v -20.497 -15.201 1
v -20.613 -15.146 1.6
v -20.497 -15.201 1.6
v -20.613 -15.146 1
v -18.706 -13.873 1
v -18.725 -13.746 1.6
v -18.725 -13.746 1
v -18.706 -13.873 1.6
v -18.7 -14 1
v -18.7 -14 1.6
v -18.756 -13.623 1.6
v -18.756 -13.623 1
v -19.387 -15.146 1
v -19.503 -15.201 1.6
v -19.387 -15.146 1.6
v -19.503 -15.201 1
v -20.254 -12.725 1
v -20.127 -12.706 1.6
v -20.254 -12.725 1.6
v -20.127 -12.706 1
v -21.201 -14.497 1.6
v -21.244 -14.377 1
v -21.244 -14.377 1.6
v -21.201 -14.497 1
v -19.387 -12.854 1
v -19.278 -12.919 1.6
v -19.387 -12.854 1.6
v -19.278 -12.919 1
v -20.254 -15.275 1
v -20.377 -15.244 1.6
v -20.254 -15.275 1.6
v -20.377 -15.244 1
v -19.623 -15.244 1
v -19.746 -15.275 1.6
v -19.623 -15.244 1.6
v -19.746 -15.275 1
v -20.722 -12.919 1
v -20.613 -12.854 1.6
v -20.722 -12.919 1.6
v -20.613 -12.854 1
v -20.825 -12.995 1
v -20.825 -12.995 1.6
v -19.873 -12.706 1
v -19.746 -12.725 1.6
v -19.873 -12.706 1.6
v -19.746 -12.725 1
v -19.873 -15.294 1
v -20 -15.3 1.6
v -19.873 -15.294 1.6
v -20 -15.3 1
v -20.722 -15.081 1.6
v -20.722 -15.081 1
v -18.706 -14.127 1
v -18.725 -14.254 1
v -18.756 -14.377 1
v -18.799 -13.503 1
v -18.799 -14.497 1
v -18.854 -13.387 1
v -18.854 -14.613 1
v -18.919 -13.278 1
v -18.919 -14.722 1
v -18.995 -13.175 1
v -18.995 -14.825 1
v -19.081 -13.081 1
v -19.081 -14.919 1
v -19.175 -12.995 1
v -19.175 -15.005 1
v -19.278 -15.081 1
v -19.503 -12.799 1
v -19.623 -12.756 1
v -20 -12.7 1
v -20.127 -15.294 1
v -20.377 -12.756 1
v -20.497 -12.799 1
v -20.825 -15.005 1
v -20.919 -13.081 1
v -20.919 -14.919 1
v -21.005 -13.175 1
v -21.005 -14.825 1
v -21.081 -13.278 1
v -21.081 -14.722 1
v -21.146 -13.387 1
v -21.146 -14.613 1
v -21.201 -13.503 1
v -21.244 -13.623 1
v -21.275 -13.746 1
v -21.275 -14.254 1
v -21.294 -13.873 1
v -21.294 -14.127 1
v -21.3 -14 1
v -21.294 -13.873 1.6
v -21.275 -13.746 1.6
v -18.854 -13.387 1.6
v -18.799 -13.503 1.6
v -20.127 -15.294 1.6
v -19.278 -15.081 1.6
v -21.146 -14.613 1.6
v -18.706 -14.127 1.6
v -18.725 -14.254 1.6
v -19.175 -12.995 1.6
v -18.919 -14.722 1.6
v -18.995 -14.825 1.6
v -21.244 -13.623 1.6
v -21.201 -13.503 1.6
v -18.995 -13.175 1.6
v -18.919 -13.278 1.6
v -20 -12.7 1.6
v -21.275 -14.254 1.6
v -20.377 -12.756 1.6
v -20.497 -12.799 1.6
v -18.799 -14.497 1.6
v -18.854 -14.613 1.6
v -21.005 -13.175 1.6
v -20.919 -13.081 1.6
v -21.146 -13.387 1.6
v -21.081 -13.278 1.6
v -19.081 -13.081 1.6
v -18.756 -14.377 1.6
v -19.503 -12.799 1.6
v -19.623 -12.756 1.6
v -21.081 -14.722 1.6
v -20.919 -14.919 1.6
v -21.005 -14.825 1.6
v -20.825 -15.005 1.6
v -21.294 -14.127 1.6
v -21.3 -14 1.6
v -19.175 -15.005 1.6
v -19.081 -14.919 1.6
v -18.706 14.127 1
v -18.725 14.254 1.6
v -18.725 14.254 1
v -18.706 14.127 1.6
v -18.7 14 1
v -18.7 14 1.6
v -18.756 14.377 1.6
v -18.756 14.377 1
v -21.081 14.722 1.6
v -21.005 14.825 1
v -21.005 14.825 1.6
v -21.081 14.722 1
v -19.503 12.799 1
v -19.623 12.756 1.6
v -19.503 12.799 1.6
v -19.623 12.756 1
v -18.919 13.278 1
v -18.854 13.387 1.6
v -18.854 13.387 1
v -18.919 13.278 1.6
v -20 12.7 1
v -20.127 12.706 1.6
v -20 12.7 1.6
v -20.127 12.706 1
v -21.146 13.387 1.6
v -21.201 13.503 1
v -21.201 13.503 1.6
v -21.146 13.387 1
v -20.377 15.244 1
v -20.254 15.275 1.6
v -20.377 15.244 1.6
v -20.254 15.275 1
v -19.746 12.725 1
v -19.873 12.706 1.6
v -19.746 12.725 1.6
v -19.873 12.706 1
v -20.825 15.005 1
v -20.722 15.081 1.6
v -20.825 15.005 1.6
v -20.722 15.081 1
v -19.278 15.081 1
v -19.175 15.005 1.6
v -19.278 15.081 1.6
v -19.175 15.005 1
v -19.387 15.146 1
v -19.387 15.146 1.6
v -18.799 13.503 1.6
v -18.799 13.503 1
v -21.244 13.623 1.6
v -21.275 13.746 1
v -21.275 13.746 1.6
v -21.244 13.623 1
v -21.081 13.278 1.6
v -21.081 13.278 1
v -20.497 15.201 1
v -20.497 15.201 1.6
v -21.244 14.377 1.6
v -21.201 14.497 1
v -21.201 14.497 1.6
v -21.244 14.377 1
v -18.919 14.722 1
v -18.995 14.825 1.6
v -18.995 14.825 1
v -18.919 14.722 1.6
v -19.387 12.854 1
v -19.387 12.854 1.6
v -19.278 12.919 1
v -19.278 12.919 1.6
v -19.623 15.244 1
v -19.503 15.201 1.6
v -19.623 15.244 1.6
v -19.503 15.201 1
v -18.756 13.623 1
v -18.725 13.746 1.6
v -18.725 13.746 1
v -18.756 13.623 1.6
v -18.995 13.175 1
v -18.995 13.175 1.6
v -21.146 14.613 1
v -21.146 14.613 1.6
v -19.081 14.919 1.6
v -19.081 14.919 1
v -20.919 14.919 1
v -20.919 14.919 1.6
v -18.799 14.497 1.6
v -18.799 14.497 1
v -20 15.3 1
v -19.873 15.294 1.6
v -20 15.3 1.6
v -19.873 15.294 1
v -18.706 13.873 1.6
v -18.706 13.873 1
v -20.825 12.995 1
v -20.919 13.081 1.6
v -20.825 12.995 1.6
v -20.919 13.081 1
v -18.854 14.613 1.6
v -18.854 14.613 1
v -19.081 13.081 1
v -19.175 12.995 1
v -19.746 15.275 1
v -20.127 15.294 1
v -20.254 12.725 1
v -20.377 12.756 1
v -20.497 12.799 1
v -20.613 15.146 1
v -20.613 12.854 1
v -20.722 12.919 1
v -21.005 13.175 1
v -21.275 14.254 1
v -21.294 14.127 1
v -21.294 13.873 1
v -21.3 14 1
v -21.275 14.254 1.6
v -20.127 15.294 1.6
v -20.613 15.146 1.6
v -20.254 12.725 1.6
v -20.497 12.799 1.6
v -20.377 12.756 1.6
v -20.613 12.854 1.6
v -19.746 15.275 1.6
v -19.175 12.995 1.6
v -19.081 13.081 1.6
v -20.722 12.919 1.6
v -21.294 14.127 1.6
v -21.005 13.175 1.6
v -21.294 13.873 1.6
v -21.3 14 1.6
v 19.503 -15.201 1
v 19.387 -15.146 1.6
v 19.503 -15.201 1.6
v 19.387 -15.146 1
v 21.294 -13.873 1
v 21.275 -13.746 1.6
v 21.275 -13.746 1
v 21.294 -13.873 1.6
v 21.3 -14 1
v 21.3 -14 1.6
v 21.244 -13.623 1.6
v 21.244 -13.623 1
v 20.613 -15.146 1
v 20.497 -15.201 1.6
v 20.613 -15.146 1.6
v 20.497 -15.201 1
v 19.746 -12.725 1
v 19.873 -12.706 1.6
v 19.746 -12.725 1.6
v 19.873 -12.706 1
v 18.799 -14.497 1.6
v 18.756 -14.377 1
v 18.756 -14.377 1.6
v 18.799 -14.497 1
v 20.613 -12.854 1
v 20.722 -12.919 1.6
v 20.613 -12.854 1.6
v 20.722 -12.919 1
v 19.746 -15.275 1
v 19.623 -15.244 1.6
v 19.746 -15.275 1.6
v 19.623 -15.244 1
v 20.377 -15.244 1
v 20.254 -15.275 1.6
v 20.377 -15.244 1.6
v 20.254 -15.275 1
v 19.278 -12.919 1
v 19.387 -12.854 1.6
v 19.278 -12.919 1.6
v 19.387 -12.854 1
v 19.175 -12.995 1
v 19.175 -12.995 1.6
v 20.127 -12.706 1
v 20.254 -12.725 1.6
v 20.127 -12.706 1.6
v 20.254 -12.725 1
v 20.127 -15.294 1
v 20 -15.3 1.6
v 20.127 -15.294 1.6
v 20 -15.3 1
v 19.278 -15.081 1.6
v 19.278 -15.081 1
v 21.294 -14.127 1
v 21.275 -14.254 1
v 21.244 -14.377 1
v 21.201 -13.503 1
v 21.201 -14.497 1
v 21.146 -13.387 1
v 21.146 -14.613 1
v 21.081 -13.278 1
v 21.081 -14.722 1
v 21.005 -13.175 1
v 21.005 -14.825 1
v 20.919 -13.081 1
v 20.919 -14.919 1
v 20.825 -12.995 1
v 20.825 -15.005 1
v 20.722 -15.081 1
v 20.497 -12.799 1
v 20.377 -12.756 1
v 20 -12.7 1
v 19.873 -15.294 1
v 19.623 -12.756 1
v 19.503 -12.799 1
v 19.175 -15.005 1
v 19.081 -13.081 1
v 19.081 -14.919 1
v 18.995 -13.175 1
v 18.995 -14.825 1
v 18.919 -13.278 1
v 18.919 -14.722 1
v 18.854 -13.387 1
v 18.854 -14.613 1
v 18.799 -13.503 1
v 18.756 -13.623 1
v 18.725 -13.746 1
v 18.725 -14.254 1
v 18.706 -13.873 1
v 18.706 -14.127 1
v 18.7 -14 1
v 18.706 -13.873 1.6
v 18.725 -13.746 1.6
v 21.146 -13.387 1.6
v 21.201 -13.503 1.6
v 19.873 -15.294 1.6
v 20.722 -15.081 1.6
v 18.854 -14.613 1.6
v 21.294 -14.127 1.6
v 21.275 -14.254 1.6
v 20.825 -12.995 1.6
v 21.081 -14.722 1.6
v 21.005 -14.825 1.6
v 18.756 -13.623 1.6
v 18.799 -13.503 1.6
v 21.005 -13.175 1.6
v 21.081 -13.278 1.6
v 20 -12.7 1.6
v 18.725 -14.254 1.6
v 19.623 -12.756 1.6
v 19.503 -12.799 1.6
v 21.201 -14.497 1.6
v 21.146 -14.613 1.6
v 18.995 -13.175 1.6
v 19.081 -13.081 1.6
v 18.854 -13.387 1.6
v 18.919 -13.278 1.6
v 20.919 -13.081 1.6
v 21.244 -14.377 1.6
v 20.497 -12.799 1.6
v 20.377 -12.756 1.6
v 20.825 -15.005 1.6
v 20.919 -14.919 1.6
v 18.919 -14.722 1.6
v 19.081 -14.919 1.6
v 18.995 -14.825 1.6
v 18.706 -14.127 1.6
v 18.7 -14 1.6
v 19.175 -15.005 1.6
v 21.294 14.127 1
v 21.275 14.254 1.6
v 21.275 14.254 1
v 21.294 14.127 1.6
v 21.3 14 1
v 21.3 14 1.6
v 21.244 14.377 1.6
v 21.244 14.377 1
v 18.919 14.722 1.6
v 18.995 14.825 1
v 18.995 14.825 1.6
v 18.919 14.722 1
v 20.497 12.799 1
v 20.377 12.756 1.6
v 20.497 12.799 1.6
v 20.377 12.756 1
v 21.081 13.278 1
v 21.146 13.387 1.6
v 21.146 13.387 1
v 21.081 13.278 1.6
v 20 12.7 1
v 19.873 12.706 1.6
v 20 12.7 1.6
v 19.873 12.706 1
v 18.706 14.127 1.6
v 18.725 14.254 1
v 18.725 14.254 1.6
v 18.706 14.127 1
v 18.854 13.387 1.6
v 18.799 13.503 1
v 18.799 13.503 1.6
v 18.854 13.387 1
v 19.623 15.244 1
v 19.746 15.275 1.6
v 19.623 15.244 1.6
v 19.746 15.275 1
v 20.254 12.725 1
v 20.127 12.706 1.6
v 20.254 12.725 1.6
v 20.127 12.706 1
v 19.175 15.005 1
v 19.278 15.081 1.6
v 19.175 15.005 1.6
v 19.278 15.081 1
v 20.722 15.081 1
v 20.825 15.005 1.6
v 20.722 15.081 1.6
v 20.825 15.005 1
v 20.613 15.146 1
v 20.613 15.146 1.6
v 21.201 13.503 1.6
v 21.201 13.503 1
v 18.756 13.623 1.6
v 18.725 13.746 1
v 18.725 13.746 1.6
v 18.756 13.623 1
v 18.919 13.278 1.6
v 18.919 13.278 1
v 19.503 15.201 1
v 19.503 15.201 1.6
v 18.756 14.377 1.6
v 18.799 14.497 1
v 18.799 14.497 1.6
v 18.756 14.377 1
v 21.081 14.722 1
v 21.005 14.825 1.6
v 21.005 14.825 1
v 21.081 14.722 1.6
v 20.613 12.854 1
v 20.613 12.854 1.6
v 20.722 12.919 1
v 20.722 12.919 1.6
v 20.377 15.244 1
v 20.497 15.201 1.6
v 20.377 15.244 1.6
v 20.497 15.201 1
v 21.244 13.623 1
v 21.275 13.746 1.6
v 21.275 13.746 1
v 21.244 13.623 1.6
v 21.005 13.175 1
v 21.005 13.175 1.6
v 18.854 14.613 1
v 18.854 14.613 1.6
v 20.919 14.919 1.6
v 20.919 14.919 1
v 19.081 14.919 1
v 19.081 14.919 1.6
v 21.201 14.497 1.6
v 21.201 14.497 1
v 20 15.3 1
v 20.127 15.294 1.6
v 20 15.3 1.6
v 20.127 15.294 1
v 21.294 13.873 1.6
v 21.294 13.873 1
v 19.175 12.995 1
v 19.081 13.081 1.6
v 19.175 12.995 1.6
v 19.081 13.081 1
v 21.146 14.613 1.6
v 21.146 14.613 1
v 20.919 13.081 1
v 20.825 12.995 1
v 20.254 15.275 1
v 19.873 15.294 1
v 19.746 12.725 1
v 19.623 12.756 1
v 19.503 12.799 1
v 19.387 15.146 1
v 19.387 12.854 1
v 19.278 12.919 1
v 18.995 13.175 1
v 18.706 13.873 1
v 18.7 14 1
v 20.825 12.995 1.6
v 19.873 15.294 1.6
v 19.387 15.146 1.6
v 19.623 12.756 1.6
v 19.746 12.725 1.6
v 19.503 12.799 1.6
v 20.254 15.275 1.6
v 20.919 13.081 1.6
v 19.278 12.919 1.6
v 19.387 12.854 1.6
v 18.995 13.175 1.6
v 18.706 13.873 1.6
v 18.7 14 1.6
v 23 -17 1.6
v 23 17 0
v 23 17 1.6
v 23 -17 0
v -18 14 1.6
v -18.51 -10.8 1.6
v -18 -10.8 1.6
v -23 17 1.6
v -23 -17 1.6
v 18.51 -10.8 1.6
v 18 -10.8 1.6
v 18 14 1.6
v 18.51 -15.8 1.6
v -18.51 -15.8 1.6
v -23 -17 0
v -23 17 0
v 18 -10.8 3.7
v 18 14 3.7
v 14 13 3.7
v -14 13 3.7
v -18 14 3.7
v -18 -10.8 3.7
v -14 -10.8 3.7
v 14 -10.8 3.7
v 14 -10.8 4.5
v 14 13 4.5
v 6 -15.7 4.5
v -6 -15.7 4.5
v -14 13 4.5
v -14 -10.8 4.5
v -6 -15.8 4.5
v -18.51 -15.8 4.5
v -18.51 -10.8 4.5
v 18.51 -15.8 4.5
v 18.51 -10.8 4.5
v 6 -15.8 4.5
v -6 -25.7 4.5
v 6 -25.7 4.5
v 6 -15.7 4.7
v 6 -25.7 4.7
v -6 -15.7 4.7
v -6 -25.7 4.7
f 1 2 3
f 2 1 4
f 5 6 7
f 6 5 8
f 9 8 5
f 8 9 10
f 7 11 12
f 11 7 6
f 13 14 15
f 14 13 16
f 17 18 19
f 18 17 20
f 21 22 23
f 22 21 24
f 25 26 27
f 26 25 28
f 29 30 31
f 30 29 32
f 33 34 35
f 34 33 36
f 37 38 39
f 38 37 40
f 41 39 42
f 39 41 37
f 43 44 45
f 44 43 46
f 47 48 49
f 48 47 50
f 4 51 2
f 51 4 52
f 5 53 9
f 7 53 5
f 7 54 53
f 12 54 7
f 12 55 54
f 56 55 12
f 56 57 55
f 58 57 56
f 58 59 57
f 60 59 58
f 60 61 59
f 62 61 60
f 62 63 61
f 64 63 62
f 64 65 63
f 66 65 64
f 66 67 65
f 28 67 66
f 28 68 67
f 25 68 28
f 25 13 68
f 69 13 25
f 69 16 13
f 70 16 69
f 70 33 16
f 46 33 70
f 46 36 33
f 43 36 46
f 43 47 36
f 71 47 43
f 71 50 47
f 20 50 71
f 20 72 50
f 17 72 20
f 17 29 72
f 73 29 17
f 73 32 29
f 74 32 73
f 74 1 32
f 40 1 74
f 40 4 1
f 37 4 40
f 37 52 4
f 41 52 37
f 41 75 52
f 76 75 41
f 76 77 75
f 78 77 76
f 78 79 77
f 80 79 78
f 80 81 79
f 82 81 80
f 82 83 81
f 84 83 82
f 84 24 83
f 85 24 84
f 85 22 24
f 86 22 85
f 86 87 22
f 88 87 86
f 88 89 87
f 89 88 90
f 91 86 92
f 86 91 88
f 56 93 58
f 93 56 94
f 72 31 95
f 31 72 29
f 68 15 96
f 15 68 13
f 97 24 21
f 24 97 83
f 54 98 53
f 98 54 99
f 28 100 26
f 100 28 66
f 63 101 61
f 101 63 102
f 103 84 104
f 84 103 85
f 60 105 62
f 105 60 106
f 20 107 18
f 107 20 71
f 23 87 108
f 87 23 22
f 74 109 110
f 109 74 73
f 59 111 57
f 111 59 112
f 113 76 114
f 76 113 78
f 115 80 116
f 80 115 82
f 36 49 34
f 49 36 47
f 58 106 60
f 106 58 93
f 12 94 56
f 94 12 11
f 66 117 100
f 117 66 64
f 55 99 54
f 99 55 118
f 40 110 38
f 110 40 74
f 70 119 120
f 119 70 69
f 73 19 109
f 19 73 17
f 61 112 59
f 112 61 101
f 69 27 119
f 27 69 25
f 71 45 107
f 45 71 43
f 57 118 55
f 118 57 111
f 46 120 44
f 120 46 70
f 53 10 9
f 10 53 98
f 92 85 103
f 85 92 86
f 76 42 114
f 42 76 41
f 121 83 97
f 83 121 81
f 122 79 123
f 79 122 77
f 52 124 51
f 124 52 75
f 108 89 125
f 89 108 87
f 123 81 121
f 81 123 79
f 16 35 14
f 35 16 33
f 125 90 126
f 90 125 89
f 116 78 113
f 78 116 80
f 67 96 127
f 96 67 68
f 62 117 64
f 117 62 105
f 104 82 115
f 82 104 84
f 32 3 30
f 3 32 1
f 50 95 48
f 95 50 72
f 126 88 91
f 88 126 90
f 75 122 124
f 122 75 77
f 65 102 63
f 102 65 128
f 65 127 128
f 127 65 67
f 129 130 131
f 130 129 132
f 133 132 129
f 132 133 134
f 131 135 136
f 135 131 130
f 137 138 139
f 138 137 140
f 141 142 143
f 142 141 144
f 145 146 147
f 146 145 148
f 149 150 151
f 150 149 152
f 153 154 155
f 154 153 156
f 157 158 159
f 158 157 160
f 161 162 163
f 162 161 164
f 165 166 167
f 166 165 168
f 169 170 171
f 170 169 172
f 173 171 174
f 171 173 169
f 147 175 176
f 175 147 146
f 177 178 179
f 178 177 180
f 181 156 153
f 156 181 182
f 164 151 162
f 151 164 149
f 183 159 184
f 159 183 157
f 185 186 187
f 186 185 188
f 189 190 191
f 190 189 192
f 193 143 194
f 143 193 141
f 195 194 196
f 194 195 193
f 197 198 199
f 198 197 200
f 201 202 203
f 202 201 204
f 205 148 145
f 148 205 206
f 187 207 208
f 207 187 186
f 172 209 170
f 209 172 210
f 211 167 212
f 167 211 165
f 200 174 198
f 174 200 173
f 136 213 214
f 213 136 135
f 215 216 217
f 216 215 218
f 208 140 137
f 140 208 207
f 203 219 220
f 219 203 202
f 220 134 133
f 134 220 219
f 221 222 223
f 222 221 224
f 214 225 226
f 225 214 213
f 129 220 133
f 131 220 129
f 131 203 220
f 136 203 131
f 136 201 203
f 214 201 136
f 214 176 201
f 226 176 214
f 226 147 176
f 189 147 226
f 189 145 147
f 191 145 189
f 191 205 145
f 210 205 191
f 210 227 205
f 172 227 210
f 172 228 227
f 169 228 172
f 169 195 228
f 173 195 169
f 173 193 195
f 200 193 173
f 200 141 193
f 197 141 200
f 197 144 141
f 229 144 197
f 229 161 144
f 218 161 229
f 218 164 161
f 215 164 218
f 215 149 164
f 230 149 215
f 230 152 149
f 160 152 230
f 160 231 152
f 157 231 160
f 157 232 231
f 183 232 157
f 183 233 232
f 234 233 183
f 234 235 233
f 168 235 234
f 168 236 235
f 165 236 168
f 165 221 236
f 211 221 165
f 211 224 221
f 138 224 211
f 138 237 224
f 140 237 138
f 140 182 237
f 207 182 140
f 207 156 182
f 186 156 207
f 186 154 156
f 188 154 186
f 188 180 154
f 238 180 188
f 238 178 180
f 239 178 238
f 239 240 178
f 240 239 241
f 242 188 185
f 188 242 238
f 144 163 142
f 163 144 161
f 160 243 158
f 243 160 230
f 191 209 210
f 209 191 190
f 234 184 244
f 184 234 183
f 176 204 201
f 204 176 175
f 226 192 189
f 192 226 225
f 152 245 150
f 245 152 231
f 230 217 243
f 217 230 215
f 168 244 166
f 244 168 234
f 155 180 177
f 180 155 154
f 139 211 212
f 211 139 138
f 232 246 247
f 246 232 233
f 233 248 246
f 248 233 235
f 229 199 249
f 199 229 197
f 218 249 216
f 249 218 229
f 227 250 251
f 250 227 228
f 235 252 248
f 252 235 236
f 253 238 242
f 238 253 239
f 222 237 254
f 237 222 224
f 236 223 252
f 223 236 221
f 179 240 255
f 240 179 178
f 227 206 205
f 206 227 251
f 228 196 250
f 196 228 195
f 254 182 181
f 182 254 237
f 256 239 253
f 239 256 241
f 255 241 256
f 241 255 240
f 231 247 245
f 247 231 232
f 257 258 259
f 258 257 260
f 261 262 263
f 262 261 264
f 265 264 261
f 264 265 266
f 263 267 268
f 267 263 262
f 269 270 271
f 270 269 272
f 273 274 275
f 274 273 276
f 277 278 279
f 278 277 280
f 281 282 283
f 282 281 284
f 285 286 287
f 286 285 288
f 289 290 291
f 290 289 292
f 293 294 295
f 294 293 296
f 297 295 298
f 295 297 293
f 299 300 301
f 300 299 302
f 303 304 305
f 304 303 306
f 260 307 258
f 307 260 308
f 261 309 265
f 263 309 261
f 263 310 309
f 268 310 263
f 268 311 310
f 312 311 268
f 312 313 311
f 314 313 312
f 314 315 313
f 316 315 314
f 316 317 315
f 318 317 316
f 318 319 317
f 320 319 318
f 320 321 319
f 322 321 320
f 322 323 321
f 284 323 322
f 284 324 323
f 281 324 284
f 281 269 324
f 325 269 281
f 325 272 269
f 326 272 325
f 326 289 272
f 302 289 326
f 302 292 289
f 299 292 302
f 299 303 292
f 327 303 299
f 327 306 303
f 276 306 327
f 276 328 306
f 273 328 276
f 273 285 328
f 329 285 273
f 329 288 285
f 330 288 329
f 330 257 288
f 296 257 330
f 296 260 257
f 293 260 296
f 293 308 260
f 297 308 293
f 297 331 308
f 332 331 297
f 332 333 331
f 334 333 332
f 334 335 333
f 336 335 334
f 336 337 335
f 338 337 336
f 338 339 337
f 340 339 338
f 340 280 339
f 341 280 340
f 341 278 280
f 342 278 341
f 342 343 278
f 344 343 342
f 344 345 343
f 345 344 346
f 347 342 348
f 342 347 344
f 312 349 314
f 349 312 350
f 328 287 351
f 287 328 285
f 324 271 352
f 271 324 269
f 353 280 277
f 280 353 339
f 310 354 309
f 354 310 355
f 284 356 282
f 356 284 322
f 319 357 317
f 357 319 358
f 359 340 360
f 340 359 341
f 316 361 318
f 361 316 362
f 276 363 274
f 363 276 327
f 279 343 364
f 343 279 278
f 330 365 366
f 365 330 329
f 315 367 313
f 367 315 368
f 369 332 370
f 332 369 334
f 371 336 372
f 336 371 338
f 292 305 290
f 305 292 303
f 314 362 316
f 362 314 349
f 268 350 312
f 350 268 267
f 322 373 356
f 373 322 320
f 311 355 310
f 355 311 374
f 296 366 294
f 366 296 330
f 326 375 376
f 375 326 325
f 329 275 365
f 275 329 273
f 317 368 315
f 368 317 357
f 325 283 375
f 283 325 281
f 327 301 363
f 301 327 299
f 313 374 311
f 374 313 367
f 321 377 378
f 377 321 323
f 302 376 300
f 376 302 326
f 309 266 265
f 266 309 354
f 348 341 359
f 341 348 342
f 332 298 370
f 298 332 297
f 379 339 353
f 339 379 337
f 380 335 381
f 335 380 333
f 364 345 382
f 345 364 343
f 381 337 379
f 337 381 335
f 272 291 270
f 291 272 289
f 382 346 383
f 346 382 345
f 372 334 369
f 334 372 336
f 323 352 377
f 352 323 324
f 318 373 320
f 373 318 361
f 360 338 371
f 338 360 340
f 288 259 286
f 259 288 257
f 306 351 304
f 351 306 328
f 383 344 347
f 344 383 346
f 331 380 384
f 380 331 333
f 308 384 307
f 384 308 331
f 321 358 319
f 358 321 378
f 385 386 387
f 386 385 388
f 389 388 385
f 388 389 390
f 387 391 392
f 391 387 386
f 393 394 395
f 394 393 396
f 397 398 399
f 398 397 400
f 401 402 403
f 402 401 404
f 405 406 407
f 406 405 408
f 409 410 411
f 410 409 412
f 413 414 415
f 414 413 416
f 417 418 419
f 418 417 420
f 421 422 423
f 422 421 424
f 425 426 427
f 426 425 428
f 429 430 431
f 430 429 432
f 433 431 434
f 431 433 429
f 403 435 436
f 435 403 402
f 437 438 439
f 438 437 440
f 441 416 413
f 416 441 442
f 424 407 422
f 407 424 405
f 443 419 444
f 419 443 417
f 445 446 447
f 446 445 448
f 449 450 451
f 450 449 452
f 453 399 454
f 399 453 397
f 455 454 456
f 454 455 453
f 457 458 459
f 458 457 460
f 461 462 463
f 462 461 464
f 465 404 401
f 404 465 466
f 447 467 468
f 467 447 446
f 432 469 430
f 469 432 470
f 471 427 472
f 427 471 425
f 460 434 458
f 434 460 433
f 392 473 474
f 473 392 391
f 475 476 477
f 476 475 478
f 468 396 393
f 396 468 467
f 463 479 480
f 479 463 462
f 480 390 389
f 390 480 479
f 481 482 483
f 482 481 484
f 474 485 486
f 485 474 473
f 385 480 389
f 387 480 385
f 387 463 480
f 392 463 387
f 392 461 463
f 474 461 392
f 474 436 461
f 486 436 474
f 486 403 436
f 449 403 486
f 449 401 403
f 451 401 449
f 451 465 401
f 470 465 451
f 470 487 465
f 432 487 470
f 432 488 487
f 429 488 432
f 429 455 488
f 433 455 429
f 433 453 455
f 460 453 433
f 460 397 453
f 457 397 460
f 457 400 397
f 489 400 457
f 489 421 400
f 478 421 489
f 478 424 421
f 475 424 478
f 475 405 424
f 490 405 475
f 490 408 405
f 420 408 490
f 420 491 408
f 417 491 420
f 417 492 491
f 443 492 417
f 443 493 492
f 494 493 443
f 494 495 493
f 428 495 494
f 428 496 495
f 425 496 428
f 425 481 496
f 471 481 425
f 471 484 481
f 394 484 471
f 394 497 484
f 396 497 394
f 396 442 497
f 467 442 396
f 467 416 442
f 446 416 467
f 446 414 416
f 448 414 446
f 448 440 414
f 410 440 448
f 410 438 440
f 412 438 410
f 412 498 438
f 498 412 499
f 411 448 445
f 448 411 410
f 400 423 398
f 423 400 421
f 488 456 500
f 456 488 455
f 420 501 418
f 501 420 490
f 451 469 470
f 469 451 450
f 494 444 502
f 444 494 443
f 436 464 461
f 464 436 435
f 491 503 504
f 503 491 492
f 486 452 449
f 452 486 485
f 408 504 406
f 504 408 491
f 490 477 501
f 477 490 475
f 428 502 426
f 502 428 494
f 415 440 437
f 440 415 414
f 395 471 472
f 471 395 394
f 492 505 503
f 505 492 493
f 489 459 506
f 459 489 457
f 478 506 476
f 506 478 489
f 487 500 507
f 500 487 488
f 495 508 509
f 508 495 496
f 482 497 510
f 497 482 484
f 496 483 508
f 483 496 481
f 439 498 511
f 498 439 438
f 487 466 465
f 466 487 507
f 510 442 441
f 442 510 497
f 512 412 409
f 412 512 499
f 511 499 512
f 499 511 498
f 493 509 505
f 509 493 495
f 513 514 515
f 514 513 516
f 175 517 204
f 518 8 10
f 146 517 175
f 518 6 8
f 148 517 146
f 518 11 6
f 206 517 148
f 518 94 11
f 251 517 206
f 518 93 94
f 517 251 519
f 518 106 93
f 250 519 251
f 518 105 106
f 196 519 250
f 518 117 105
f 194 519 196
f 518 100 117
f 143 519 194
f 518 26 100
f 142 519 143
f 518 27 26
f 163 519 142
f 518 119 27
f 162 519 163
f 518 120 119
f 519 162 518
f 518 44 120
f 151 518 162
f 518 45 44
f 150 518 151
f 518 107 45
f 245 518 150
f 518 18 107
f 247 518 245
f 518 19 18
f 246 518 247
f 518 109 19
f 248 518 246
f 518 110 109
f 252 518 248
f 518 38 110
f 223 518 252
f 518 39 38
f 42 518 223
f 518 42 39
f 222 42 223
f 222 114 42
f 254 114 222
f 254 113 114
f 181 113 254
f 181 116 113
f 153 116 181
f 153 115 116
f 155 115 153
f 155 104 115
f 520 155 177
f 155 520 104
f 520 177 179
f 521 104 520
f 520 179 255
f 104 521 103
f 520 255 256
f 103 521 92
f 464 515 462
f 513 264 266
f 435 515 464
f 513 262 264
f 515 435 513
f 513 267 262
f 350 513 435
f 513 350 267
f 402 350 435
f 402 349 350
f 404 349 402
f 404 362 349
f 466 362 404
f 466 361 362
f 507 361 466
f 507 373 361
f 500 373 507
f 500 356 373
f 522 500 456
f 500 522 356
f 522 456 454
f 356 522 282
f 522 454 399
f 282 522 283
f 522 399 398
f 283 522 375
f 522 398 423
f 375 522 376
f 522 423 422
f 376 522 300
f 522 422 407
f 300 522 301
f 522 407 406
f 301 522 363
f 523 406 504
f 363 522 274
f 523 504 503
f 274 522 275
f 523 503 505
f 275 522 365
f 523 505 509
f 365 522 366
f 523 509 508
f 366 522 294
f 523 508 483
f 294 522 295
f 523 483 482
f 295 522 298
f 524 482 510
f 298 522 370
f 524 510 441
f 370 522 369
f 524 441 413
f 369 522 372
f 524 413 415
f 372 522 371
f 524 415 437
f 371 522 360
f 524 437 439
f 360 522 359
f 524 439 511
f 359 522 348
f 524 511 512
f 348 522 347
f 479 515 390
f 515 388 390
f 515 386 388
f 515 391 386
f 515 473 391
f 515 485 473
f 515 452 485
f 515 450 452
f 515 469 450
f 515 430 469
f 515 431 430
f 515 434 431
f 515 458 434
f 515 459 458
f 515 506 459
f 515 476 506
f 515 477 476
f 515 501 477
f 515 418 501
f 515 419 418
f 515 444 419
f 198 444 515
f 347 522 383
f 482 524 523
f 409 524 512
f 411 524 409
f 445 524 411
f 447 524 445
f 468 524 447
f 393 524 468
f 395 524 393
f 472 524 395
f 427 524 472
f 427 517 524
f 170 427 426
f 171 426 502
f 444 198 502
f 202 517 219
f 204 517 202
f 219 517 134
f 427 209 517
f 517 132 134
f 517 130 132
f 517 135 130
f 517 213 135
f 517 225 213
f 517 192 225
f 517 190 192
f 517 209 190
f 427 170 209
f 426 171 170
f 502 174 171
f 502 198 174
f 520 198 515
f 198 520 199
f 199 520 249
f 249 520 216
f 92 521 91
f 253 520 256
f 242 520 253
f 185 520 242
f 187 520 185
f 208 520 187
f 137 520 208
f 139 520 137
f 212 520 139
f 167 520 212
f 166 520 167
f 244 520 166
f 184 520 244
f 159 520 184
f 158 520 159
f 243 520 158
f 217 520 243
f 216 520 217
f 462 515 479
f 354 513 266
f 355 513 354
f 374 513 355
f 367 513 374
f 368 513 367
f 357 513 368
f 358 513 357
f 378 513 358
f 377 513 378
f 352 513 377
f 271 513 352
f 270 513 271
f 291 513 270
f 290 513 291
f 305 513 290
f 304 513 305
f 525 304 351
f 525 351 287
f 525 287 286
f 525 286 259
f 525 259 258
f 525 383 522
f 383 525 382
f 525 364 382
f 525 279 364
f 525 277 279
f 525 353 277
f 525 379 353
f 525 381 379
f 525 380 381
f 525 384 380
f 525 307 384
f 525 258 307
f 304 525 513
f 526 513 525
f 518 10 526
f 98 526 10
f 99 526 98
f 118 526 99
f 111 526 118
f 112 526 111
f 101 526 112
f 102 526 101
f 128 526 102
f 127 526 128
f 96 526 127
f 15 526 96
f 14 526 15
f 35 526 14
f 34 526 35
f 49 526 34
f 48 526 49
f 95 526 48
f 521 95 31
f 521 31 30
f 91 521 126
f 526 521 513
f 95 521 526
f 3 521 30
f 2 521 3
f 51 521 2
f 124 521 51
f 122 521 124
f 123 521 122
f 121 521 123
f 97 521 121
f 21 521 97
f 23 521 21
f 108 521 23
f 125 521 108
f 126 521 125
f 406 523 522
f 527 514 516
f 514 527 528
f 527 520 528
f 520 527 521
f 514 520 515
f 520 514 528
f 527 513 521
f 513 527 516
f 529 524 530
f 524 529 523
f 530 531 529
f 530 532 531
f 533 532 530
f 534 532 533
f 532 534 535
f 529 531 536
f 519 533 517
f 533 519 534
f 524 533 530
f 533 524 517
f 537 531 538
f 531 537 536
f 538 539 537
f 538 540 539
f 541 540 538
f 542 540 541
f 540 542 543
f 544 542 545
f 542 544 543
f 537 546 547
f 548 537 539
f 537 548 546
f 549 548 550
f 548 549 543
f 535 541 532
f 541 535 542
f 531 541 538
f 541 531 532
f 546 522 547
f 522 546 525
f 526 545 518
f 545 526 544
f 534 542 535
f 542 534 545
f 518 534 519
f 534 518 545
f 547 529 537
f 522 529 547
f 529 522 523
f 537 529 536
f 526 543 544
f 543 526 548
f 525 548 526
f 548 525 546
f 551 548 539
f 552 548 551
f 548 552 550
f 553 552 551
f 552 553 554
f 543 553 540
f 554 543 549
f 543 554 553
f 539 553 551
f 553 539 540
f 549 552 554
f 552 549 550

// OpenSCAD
$fn = 64;

// LCD TFT Display Module 128x160
// Overall PCB: 46.0mm x 34.0mm
// Single connected solid (union of all parts). No floating geometry.
// Holes are modeled as shallow recesses (not through-cuts) to keep one solid.

module lcd_tft_128x160_module(
    pcb_x = 46.0,
    pcb_y = 34.0,
    pcb_t = 1.6,

    // Bezel/frame on top of PCB
    bezel_x = 36.0,
    bezel_y = 28.0,
    bezel_t = 2.2,

    // Active screen (glass) on top of bezel
    screen_x = 28.0,
    screen_y = 35.0,   // portrait-ish active area representation
    screen_t = 0.8,

    // Header pads + connector body along one long edge
    header_pins = 14,
    header_pitch = 2.54,
    header_pad_d = 1.6,
    header_pad_h = 0.25,

    conn_y = 5.0,
    conn_z = 3.0,

    // FPC tail (thin flex) extending from connector edge
    fpc_w = 12.0,
    fpc_len = 10.0,
    fpc_t = 0.2
) {
    eps = 0.2; // small overlap to guarantee connectivity

    // Derived placement
    pad_span = (header_pins - 1) * header_pitch;
    conn_x = pad_span + 4.0;

    // Place connector near -Y edge, fully on PCB
    edge_margin = 1.2;
    conn_center_y = -pcb_y/2 + edge_margin + conn_y/2;

    // Z stacking (all connected with slight overlaps)
    pcb_z0 = 0;
    pcb_z1 = pcb_t;

    bezel_center_z = pcb_z1 + bezel_t/2 - eps/2;
    screen_center_z = (pcb_z1 + bezel_t) + screen_t/2 - eps/2;

    // Header pads sit on PCB top, slightly overlapping into PCB
    pad_z0 = pcb_z1 - eps;
    pad_h = header_pad_h + eps;

    // Connector body sits on PCB top, overlaps into PCB
    conn_center_z = pcb_z1 + conn_z/2 - eps/2;

    // FPC tail extends outward from connector toward -Y, attached to connector top
    fpc_center_x = 0;
    fpc_center_y = (conn_center_y - conn_y/2) - fpc_len/2 + eps/2; // overlap into connector
    fpc_center_z = (pcb_z1 + conn_z) - fpc_t/2 + eps/2;            // overlap into connector

    // Mounting hole recesses (shallow dimples) to keep one solid
    hole_d = 2.6;
    hole_off = 3.0;
    hole_recess = 0.6; // depth from top surface

    // Screen clamp tabs (light gray) like reference images: two blocks at connector edge
    tab_x = 6.0;
    tab_y = conn_y;
    tab_z = conn_z;
    tab_center_z = conn_center_z;
    tab_center_y = conn_center_y;

    tab_center_x_left  = -bezel_x/2 + tab_x/2 + 1.0;
    tab_center_x_right =  bezel_x/2 - tab_x/2 - 1.0;

    union() {
        // PCB with shallow recesses for mounting holes
        color([0.05, 0.35, 0.12])
        difference() {
            translate([-pcb_x/2, -pcb_y/2, pcb_z0])
                cube([pcb_x, pcb_y, pcb_t], center=false);

            // recess from top only (does not cut through)
            for (sx = [-1, 1], sy = [-1, 1]) {
                translate([sx*(pcb_x/2 - hole_off), sy*(pcb_y/2 - hole_off), pcb_z1 - hole_recess])
                    cylinder(d=hole_d, h=hole_recess + 0.05, center=false);
            }
        }

        // Bezel/frame (centered)
        color([0.08, 0.08, 0.08])
        translate([0, 0, bezel_center_z])
            cube([bezel_x, bezel_y, bezel_t], center=true);

        // Active screen area (clamped to bezel footprint)
        screen_y_eff = min(screen_y, bezel_y - 2);
        color([0.02, 0.02, 0.02])
        translate([0, 0, screen_center_z])
            cube([screen_x, screen_y_eff, screen_t], center=true);

        // Header pads along connector edge (near -Y)
        color([0.85, 0.7, 0.2])
        for (i = [0:header_pins-1]) {
            x = -pad_span/2 + i*header_pitch;
            translate([x, conn_center_y, pad_z0])
                cylinder(d=header_pad_d, h=pad_h, center=false);
        }

        // Connector body (white/gray), attached to PCB
        color([0.9, 0.9, 0.9])
        translate([0, conn_center_y, conn_center_z])
            cube([conn_x, conn_y, conn_z], center=true);

        // Two clamp tabs (light gray) at left/right ends of connector
        color([0.75, 0.75, 0.75])
        translate([tab_center_x_left, tab_center_y, tab_center_z])
            cube([tab_x, tab_y, tab_z], center=true);

        color([0.75, 0.75, 0.75])
        translate([tab_center_x_right, tab_center_y, tab_center_z])
            cube([tab_x, tab_y, tab_z], center=true);

        // FPC tail (thin flex) extending outward from connector edge
        color([0.85, 0.75, 0.35])
        translate([fpc_center_x, fpc_center_y, fpc_center_z])
            cube([fpc_w, fpc_len, fpc_t], center=true);
    }
}

lcd_tft_128x160_module();
